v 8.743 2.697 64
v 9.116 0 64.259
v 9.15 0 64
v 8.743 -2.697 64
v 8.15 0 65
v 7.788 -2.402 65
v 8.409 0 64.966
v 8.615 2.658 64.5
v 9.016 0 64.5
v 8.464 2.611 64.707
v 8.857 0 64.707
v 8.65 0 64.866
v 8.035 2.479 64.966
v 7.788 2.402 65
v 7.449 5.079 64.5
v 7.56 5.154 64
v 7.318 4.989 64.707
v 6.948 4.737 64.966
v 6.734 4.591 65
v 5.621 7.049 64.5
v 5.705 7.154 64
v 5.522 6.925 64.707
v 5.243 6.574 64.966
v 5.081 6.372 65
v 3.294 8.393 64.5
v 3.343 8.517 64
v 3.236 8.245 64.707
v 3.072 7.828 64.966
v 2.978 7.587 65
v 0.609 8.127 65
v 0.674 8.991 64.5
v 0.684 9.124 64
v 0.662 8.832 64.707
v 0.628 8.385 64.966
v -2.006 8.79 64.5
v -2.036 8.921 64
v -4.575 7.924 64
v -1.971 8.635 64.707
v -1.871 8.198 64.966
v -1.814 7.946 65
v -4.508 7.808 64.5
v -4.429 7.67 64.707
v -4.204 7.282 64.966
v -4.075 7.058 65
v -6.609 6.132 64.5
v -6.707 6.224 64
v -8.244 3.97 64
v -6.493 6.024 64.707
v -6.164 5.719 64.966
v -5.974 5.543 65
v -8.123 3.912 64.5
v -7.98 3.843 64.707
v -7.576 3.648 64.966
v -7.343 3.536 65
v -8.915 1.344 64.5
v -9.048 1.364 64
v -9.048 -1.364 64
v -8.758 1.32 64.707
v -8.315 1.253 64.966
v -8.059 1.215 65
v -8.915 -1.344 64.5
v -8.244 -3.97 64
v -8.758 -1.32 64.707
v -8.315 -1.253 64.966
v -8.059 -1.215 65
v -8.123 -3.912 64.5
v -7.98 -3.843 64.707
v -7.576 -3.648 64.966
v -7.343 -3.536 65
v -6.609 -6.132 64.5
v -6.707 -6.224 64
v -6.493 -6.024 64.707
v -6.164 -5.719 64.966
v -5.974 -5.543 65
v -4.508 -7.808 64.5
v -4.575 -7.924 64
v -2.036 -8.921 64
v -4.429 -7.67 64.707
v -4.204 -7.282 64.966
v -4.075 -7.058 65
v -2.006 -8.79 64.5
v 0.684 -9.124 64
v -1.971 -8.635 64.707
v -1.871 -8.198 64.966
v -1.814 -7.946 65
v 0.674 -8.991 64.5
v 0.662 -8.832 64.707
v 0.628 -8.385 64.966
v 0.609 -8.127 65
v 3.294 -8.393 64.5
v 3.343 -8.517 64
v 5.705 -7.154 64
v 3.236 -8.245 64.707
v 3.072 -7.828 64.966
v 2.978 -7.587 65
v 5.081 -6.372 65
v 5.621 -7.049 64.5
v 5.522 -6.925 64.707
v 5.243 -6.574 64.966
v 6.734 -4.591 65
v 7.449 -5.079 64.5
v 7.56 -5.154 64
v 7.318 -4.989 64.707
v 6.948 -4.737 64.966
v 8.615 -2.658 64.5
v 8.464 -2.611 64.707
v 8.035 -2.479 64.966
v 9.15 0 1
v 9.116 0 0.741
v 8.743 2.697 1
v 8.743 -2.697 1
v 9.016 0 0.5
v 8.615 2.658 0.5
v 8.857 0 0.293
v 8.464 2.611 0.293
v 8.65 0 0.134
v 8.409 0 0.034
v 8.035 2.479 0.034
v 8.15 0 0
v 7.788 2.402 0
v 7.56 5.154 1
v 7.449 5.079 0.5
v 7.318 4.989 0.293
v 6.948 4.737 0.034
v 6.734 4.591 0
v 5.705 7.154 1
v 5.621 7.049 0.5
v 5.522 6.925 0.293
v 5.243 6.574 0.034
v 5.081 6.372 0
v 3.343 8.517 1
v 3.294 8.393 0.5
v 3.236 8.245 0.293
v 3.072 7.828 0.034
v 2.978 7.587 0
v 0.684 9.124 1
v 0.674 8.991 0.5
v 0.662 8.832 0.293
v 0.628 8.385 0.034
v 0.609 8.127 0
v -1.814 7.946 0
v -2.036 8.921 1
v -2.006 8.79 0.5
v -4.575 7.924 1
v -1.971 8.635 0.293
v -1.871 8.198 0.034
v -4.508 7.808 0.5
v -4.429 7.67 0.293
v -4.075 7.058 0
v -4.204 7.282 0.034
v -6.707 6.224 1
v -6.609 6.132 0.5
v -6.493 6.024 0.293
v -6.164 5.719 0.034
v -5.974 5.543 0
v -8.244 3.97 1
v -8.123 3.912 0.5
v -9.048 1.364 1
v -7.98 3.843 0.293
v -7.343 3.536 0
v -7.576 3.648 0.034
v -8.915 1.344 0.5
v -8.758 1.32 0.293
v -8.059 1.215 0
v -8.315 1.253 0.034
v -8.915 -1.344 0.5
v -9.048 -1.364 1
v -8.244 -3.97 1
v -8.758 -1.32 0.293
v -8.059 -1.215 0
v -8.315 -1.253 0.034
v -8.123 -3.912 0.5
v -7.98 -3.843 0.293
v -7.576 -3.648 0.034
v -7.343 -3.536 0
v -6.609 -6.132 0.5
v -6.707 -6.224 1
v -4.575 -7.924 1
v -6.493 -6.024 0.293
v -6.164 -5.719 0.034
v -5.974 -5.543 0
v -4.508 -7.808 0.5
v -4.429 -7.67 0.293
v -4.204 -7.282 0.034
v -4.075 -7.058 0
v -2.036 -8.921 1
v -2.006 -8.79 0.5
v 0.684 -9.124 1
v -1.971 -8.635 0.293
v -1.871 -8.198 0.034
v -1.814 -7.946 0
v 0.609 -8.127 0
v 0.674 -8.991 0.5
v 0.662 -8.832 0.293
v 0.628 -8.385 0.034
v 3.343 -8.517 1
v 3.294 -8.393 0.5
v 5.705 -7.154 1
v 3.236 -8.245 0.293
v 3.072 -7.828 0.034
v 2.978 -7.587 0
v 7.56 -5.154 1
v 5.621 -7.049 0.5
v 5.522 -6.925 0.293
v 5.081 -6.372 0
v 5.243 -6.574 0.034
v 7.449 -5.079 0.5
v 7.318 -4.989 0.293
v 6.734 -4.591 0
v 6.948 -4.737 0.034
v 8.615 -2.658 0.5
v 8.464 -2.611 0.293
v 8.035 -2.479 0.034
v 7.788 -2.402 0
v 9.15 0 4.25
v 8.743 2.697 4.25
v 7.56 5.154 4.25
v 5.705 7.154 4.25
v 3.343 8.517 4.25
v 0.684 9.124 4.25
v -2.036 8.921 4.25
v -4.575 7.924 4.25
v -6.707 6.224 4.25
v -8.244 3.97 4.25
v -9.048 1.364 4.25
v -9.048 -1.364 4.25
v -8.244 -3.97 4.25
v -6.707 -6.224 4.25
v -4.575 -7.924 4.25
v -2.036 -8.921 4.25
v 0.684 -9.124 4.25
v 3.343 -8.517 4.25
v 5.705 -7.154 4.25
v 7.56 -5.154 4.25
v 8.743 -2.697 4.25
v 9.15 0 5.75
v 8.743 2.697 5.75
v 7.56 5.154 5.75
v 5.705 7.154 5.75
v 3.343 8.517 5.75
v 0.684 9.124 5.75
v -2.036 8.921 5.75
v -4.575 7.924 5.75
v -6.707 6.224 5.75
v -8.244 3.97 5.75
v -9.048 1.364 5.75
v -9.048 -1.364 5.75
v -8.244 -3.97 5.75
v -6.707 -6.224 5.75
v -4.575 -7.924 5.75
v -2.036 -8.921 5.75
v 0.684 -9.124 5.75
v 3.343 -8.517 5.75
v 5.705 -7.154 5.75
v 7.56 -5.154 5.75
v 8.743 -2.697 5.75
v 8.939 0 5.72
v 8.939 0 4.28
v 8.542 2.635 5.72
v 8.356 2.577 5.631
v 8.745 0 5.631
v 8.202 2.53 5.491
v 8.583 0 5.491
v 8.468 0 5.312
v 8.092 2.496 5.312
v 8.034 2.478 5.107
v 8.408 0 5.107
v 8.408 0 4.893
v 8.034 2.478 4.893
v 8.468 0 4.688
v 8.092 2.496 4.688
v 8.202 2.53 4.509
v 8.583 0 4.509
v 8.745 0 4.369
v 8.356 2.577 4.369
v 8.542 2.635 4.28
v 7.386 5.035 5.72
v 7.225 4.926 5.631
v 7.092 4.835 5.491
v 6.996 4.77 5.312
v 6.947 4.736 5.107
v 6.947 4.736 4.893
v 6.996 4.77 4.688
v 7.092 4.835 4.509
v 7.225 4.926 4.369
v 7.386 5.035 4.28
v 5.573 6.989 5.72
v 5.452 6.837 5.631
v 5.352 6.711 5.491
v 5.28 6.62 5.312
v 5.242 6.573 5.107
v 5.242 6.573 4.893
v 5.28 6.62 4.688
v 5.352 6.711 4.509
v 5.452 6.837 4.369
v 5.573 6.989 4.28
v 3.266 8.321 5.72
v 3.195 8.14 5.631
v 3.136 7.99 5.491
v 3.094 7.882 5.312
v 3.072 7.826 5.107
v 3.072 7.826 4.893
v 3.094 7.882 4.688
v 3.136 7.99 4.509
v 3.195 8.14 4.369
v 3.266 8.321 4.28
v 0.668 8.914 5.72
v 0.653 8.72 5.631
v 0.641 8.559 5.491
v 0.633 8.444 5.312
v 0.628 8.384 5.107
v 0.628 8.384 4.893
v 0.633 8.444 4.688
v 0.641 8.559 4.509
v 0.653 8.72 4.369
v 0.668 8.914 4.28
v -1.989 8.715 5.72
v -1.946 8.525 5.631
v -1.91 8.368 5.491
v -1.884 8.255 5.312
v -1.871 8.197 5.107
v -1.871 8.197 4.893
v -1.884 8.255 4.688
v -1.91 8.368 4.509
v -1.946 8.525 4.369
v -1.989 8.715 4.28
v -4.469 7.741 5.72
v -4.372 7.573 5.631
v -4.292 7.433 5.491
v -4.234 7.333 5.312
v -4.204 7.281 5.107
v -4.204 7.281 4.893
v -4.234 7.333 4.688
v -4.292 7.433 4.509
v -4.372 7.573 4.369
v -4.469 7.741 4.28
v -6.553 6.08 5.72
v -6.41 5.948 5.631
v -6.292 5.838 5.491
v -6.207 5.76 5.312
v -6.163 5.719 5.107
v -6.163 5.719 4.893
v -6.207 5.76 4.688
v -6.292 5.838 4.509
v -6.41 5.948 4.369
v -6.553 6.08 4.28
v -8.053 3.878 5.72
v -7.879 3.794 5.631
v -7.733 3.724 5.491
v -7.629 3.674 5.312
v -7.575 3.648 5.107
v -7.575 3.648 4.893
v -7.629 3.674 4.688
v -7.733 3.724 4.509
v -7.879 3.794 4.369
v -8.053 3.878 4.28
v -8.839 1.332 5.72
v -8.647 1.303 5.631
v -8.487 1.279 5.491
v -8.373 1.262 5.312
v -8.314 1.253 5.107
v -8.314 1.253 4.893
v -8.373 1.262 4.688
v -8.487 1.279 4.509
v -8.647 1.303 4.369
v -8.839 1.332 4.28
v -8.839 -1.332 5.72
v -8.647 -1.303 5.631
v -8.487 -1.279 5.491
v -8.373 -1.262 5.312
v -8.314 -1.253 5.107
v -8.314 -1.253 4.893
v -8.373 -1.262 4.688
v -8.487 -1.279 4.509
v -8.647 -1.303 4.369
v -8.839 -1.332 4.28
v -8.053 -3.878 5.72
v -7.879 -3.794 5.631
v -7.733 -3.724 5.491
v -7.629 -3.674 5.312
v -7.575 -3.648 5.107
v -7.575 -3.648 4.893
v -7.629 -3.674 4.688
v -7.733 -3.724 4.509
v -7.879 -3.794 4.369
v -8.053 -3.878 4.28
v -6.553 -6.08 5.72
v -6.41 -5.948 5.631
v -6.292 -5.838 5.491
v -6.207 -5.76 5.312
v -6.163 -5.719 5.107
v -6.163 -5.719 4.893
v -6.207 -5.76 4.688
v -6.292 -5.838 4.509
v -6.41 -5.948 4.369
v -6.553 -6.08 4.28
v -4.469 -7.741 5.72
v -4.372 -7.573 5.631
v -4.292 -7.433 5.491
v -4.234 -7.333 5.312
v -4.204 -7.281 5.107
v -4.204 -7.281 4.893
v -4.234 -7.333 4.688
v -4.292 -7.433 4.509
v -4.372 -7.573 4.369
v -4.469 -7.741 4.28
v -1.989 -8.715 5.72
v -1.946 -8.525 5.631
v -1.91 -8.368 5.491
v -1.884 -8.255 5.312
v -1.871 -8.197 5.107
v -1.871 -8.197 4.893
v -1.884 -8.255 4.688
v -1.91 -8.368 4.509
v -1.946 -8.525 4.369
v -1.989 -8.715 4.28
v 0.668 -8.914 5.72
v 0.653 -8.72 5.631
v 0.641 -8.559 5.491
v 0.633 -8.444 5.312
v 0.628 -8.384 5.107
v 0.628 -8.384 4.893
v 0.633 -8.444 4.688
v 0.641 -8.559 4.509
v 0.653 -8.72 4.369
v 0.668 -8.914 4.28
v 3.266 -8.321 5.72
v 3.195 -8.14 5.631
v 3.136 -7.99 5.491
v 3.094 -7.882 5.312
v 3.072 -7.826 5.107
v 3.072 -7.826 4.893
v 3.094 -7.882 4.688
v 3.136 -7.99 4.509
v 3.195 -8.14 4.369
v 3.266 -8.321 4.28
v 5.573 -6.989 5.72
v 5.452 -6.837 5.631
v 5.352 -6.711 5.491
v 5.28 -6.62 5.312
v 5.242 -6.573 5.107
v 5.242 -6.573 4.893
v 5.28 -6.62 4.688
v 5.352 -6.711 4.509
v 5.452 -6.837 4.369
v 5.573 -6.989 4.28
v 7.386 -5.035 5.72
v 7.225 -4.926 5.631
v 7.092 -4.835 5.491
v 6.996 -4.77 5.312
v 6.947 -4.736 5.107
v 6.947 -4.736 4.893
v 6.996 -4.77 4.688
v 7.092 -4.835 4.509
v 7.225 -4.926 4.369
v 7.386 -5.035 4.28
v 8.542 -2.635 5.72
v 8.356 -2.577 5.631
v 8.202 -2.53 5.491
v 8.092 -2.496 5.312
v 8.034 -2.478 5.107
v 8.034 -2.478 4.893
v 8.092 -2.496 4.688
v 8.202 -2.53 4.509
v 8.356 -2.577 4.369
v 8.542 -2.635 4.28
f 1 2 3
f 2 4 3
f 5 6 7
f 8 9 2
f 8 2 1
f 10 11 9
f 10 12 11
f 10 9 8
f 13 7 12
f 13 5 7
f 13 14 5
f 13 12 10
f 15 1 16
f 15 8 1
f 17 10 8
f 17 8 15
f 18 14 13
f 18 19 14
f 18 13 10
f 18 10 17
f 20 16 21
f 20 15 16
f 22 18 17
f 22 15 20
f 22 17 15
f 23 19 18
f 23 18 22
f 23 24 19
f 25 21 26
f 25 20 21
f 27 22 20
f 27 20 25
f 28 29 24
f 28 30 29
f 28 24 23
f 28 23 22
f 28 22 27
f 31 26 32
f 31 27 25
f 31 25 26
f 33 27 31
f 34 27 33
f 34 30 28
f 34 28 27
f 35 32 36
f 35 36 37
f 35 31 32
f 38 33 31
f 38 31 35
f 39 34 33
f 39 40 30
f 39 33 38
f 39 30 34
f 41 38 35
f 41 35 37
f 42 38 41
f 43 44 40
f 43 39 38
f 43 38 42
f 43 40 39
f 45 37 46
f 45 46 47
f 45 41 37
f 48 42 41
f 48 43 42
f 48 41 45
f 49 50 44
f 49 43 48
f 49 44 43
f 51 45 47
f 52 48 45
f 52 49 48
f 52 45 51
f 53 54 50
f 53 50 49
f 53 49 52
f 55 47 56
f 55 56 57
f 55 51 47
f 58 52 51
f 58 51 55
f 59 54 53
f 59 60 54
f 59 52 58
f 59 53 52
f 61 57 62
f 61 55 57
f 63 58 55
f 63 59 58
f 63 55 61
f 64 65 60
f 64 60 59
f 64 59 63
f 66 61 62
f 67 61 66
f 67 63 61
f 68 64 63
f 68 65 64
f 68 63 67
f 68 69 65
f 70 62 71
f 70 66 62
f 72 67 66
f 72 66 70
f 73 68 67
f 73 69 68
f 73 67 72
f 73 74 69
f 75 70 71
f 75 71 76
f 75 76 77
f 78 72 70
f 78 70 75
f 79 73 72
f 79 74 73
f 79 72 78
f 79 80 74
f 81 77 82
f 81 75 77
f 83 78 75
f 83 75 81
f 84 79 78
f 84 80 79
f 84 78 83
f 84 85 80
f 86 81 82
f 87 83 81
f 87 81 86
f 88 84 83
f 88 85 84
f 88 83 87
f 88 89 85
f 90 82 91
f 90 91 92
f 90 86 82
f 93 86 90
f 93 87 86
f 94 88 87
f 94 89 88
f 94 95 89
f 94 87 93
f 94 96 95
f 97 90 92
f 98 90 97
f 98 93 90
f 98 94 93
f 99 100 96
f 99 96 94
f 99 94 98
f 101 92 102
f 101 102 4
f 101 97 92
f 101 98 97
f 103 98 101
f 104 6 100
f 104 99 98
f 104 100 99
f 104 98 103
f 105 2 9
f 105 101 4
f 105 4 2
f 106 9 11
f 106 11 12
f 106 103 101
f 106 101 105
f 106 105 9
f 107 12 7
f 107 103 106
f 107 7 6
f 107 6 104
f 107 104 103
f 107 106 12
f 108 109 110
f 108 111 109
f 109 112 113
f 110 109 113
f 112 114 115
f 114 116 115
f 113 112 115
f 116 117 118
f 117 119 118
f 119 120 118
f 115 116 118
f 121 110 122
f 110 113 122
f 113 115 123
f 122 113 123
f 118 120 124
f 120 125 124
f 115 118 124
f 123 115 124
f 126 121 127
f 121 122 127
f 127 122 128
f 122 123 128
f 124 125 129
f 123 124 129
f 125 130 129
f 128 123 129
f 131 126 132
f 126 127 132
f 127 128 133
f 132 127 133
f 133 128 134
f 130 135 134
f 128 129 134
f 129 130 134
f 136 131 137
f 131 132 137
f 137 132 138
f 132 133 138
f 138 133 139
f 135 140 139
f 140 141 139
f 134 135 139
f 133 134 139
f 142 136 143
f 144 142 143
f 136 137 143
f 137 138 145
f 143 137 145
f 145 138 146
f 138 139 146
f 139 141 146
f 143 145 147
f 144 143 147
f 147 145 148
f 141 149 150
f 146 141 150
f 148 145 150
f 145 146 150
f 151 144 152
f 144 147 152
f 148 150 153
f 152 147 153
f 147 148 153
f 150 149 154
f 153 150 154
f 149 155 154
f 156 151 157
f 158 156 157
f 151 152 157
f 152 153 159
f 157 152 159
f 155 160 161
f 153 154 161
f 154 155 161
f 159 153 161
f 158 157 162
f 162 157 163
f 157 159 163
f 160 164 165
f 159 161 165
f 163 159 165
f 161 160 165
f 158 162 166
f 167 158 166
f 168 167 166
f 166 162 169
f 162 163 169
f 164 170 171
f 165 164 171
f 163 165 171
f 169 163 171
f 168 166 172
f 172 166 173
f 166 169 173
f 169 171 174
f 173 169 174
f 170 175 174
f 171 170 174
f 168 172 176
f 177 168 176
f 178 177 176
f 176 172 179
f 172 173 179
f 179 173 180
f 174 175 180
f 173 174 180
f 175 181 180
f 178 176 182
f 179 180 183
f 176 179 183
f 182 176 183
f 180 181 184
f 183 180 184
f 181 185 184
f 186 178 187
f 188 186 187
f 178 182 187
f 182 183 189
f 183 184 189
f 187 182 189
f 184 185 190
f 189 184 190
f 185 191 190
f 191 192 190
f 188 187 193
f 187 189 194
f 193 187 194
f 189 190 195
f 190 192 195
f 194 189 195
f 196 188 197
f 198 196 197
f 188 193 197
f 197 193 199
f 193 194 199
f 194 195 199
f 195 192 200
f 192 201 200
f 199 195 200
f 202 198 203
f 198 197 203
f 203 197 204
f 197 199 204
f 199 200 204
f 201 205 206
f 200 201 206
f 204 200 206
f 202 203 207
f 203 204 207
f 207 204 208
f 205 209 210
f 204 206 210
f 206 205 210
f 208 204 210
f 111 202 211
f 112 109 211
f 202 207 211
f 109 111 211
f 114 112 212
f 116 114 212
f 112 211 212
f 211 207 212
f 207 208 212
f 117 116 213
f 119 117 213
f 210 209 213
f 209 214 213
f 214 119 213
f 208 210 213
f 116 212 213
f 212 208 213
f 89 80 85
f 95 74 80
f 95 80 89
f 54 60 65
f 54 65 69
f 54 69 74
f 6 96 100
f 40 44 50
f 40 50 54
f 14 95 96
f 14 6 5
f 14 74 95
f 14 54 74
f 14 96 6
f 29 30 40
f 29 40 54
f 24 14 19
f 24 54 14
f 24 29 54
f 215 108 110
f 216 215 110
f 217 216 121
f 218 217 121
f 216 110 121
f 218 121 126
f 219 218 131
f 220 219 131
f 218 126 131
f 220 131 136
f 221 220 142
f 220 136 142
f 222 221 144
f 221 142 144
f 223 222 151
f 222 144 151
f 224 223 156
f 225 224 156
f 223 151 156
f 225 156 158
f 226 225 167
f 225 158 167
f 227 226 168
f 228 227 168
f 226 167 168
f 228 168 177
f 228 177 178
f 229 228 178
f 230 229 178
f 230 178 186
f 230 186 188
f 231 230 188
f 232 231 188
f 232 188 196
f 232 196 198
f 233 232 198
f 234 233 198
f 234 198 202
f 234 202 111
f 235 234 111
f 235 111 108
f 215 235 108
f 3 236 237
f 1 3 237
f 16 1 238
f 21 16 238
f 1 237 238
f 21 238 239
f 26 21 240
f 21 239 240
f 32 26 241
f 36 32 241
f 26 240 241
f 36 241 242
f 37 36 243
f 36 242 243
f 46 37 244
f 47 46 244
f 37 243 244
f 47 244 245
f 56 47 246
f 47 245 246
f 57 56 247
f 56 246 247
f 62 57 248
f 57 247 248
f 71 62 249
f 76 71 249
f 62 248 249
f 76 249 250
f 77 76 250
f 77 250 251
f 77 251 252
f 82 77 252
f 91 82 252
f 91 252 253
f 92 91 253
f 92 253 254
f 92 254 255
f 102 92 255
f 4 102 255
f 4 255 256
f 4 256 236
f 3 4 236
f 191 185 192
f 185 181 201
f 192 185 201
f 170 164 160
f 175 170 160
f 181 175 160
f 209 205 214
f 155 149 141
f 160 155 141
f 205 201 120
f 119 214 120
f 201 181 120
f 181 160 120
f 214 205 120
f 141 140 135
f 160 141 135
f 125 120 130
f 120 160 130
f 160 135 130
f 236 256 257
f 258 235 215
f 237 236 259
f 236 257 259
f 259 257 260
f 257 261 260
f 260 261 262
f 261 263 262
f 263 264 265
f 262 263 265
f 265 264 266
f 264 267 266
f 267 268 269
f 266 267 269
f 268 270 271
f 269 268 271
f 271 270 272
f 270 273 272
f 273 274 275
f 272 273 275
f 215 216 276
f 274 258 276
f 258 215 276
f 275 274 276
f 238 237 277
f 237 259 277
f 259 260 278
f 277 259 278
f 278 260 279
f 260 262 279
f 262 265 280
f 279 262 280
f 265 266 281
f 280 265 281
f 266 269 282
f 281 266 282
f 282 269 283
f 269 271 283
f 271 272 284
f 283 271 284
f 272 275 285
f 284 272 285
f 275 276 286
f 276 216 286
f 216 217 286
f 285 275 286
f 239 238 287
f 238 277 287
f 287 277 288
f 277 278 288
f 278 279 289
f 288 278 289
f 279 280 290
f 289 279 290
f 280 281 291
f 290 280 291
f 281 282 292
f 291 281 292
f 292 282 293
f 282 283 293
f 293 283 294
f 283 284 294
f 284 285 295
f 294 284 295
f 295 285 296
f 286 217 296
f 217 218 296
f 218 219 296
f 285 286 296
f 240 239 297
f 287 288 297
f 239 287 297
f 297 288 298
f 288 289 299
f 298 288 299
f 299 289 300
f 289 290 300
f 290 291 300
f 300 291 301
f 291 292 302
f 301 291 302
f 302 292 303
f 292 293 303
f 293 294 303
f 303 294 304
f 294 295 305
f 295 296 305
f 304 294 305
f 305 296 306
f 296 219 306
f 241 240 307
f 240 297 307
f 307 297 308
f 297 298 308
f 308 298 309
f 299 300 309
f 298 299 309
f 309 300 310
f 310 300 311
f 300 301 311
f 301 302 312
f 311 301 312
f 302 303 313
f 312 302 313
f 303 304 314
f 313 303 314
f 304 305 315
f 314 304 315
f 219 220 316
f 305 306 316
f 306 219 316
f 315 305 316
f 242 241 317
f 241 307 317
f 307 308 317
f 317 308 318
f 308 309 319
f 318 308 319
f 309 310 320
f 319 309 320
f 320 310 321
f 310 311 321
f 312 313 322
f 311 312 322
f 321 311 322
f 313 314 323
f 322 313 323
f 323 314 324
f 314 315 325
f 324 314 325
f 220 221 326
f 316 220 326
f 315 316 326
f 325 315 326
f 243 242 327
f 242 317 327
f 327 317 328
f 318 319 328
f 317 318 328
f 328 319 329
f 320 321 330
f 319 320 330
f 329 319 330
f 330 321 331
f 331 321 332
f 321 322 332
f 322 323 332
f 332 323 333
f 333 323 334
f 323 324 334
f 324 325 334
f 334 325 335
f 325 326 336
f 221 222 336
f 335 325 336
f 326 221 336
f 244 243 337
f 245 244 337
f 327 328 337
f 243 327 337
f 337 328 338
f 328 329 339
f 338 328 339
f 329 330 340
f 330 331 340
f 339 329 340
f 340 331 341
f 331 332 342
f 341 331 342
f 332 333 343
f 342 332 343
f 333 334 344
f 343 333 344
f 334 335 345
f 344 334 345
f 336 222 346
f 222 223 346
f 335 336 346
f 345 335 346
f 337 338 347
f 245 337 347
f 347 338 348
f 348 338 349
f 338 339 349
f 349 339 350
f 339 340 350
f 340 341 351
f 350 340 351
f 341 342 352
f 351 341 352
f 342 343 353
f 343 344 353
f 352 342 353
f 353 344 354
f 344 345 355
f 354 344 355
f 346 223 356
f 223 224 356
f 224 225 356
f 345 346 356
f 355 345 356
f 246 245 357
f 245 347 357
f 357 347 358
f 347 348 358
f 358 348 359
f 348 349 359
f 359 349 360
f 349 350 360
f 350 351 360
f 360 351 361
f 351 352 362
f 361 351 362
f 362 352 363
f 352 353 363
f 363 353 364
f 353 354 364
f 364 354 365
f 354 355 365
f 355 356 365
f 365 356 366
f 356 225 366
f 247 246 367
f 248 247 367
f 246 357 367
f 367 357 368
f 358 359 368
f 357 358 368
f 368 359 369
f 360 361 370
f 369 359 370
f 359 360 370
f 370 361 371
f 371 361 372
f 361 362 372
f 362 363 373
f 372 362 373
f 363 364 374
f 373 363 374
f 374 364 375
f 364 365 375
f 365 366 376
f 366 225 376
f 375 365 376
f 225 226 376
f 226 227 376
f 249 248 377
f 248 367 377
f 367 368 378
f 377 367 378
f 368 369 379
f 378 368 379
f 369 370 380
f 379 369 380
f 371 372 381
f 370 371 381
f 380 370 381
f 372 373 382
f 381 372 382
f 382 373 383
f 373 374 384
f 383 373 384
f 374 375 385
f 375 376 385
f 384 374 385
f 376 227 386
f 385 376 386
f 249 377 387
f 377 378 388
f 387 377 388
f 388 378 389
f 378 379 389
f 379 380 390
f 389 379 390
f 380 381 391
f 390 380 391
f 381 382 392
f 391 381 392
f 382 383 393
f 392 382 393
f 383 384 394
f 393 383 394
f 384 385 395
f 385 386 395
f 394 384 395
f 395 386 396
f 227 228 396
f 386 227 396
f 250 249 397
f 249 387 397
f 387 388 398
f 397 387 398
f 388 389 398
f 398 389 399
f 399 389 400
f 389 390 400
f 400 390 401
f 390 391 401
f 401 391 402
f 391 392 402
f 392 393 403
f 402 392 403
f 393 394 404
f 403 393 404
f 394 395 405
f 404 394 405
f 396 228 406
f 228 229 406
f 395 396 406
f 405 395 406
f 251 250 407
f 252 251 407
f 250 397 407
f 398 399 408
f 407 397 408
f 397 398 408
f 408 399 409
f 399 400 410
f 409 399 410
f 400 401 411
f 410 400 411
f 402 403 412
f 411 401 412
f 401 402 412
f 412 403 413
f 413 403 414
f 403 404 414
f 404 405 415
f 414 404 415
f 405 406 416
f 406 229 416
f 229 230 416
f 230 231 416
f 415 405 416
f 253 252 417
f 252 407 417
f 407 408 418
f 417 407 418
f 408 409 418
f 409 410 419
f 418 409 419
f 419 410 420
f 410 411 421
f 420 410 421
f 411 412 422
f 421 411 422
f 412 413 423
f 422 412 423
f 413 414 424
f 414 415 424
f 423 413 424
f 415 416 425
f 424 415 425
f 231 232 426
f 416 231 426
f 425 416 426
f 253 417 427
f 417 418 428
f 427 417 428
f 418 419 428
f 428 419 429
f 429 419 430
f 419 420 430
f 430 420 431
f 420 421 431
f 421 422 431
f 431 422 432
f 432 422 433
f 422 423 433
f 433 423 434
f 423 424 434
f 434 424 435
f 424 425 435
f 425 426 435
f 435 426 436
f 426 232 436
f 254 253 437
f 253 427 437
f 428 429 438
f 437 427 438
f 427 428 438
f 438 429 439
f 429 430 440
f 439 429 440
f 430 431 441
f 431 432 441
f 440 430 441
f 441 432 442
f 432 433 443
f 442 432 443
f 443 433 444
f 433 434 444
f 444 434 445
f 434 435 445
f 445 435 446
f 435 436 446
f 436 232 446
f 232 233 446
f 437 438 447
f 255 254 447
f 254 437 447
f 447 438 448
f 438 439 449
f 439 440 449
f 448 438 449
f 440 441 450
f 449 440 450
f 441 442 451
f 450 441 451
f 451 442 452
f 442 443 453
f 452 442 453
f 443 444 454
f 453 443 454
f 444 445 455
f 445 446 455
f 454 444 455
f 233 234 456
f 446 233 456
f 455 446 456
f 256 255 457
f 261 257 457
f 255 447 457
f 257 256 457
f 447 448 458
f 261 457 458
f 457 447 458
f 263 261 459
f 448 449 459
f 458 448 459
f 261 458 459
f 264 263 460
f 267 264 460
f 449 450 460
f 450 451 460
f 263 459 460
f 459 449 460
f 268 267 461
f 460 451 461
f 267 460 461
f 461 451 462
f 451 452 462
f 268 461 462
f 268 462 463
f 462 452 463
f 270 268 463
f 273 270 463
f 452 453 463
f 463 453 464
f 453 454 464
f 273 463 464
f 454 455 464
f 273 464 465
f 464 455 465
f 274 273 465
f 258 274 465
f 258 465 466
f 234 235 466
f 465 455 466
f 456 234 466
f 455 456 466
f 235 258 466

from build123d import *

# Parameters (mm, degrees)
F0_R     = 9.15
F1_DEPTH = 65
F4_R     = 1


with BuildPart() as f1:
    # F0 (on Top) → F1 (new body)
    with BuildSketch(Plane.XY):
        Circle(F0_R)
    extrude(amount=F1_DEPTH)

    # F2 (on Front) → F3 (revolve, cut)
    with BuildSketch(Plane.XZ):
        with BuildLine():
            Line((9.15, 4.25), (9.15, 5.75))
            ThreePointArc((9.15, 5.75), (8.4, 5), (9.15, 4.25))
        make_face()
    revolve(axis=Axis((0, 0, 13.149248), (0, 0, 1)), mode=Mode.SUBTRACT)

    # F4
    f4_edges = [f1.edges().sort_by_distance(p)[0] for p in [
        (-9.15, 0, 65),
        (-9.15, 0, 0),
    ]]
    fillet(f4_edges, radius=F4_R)


solid = f1.part
